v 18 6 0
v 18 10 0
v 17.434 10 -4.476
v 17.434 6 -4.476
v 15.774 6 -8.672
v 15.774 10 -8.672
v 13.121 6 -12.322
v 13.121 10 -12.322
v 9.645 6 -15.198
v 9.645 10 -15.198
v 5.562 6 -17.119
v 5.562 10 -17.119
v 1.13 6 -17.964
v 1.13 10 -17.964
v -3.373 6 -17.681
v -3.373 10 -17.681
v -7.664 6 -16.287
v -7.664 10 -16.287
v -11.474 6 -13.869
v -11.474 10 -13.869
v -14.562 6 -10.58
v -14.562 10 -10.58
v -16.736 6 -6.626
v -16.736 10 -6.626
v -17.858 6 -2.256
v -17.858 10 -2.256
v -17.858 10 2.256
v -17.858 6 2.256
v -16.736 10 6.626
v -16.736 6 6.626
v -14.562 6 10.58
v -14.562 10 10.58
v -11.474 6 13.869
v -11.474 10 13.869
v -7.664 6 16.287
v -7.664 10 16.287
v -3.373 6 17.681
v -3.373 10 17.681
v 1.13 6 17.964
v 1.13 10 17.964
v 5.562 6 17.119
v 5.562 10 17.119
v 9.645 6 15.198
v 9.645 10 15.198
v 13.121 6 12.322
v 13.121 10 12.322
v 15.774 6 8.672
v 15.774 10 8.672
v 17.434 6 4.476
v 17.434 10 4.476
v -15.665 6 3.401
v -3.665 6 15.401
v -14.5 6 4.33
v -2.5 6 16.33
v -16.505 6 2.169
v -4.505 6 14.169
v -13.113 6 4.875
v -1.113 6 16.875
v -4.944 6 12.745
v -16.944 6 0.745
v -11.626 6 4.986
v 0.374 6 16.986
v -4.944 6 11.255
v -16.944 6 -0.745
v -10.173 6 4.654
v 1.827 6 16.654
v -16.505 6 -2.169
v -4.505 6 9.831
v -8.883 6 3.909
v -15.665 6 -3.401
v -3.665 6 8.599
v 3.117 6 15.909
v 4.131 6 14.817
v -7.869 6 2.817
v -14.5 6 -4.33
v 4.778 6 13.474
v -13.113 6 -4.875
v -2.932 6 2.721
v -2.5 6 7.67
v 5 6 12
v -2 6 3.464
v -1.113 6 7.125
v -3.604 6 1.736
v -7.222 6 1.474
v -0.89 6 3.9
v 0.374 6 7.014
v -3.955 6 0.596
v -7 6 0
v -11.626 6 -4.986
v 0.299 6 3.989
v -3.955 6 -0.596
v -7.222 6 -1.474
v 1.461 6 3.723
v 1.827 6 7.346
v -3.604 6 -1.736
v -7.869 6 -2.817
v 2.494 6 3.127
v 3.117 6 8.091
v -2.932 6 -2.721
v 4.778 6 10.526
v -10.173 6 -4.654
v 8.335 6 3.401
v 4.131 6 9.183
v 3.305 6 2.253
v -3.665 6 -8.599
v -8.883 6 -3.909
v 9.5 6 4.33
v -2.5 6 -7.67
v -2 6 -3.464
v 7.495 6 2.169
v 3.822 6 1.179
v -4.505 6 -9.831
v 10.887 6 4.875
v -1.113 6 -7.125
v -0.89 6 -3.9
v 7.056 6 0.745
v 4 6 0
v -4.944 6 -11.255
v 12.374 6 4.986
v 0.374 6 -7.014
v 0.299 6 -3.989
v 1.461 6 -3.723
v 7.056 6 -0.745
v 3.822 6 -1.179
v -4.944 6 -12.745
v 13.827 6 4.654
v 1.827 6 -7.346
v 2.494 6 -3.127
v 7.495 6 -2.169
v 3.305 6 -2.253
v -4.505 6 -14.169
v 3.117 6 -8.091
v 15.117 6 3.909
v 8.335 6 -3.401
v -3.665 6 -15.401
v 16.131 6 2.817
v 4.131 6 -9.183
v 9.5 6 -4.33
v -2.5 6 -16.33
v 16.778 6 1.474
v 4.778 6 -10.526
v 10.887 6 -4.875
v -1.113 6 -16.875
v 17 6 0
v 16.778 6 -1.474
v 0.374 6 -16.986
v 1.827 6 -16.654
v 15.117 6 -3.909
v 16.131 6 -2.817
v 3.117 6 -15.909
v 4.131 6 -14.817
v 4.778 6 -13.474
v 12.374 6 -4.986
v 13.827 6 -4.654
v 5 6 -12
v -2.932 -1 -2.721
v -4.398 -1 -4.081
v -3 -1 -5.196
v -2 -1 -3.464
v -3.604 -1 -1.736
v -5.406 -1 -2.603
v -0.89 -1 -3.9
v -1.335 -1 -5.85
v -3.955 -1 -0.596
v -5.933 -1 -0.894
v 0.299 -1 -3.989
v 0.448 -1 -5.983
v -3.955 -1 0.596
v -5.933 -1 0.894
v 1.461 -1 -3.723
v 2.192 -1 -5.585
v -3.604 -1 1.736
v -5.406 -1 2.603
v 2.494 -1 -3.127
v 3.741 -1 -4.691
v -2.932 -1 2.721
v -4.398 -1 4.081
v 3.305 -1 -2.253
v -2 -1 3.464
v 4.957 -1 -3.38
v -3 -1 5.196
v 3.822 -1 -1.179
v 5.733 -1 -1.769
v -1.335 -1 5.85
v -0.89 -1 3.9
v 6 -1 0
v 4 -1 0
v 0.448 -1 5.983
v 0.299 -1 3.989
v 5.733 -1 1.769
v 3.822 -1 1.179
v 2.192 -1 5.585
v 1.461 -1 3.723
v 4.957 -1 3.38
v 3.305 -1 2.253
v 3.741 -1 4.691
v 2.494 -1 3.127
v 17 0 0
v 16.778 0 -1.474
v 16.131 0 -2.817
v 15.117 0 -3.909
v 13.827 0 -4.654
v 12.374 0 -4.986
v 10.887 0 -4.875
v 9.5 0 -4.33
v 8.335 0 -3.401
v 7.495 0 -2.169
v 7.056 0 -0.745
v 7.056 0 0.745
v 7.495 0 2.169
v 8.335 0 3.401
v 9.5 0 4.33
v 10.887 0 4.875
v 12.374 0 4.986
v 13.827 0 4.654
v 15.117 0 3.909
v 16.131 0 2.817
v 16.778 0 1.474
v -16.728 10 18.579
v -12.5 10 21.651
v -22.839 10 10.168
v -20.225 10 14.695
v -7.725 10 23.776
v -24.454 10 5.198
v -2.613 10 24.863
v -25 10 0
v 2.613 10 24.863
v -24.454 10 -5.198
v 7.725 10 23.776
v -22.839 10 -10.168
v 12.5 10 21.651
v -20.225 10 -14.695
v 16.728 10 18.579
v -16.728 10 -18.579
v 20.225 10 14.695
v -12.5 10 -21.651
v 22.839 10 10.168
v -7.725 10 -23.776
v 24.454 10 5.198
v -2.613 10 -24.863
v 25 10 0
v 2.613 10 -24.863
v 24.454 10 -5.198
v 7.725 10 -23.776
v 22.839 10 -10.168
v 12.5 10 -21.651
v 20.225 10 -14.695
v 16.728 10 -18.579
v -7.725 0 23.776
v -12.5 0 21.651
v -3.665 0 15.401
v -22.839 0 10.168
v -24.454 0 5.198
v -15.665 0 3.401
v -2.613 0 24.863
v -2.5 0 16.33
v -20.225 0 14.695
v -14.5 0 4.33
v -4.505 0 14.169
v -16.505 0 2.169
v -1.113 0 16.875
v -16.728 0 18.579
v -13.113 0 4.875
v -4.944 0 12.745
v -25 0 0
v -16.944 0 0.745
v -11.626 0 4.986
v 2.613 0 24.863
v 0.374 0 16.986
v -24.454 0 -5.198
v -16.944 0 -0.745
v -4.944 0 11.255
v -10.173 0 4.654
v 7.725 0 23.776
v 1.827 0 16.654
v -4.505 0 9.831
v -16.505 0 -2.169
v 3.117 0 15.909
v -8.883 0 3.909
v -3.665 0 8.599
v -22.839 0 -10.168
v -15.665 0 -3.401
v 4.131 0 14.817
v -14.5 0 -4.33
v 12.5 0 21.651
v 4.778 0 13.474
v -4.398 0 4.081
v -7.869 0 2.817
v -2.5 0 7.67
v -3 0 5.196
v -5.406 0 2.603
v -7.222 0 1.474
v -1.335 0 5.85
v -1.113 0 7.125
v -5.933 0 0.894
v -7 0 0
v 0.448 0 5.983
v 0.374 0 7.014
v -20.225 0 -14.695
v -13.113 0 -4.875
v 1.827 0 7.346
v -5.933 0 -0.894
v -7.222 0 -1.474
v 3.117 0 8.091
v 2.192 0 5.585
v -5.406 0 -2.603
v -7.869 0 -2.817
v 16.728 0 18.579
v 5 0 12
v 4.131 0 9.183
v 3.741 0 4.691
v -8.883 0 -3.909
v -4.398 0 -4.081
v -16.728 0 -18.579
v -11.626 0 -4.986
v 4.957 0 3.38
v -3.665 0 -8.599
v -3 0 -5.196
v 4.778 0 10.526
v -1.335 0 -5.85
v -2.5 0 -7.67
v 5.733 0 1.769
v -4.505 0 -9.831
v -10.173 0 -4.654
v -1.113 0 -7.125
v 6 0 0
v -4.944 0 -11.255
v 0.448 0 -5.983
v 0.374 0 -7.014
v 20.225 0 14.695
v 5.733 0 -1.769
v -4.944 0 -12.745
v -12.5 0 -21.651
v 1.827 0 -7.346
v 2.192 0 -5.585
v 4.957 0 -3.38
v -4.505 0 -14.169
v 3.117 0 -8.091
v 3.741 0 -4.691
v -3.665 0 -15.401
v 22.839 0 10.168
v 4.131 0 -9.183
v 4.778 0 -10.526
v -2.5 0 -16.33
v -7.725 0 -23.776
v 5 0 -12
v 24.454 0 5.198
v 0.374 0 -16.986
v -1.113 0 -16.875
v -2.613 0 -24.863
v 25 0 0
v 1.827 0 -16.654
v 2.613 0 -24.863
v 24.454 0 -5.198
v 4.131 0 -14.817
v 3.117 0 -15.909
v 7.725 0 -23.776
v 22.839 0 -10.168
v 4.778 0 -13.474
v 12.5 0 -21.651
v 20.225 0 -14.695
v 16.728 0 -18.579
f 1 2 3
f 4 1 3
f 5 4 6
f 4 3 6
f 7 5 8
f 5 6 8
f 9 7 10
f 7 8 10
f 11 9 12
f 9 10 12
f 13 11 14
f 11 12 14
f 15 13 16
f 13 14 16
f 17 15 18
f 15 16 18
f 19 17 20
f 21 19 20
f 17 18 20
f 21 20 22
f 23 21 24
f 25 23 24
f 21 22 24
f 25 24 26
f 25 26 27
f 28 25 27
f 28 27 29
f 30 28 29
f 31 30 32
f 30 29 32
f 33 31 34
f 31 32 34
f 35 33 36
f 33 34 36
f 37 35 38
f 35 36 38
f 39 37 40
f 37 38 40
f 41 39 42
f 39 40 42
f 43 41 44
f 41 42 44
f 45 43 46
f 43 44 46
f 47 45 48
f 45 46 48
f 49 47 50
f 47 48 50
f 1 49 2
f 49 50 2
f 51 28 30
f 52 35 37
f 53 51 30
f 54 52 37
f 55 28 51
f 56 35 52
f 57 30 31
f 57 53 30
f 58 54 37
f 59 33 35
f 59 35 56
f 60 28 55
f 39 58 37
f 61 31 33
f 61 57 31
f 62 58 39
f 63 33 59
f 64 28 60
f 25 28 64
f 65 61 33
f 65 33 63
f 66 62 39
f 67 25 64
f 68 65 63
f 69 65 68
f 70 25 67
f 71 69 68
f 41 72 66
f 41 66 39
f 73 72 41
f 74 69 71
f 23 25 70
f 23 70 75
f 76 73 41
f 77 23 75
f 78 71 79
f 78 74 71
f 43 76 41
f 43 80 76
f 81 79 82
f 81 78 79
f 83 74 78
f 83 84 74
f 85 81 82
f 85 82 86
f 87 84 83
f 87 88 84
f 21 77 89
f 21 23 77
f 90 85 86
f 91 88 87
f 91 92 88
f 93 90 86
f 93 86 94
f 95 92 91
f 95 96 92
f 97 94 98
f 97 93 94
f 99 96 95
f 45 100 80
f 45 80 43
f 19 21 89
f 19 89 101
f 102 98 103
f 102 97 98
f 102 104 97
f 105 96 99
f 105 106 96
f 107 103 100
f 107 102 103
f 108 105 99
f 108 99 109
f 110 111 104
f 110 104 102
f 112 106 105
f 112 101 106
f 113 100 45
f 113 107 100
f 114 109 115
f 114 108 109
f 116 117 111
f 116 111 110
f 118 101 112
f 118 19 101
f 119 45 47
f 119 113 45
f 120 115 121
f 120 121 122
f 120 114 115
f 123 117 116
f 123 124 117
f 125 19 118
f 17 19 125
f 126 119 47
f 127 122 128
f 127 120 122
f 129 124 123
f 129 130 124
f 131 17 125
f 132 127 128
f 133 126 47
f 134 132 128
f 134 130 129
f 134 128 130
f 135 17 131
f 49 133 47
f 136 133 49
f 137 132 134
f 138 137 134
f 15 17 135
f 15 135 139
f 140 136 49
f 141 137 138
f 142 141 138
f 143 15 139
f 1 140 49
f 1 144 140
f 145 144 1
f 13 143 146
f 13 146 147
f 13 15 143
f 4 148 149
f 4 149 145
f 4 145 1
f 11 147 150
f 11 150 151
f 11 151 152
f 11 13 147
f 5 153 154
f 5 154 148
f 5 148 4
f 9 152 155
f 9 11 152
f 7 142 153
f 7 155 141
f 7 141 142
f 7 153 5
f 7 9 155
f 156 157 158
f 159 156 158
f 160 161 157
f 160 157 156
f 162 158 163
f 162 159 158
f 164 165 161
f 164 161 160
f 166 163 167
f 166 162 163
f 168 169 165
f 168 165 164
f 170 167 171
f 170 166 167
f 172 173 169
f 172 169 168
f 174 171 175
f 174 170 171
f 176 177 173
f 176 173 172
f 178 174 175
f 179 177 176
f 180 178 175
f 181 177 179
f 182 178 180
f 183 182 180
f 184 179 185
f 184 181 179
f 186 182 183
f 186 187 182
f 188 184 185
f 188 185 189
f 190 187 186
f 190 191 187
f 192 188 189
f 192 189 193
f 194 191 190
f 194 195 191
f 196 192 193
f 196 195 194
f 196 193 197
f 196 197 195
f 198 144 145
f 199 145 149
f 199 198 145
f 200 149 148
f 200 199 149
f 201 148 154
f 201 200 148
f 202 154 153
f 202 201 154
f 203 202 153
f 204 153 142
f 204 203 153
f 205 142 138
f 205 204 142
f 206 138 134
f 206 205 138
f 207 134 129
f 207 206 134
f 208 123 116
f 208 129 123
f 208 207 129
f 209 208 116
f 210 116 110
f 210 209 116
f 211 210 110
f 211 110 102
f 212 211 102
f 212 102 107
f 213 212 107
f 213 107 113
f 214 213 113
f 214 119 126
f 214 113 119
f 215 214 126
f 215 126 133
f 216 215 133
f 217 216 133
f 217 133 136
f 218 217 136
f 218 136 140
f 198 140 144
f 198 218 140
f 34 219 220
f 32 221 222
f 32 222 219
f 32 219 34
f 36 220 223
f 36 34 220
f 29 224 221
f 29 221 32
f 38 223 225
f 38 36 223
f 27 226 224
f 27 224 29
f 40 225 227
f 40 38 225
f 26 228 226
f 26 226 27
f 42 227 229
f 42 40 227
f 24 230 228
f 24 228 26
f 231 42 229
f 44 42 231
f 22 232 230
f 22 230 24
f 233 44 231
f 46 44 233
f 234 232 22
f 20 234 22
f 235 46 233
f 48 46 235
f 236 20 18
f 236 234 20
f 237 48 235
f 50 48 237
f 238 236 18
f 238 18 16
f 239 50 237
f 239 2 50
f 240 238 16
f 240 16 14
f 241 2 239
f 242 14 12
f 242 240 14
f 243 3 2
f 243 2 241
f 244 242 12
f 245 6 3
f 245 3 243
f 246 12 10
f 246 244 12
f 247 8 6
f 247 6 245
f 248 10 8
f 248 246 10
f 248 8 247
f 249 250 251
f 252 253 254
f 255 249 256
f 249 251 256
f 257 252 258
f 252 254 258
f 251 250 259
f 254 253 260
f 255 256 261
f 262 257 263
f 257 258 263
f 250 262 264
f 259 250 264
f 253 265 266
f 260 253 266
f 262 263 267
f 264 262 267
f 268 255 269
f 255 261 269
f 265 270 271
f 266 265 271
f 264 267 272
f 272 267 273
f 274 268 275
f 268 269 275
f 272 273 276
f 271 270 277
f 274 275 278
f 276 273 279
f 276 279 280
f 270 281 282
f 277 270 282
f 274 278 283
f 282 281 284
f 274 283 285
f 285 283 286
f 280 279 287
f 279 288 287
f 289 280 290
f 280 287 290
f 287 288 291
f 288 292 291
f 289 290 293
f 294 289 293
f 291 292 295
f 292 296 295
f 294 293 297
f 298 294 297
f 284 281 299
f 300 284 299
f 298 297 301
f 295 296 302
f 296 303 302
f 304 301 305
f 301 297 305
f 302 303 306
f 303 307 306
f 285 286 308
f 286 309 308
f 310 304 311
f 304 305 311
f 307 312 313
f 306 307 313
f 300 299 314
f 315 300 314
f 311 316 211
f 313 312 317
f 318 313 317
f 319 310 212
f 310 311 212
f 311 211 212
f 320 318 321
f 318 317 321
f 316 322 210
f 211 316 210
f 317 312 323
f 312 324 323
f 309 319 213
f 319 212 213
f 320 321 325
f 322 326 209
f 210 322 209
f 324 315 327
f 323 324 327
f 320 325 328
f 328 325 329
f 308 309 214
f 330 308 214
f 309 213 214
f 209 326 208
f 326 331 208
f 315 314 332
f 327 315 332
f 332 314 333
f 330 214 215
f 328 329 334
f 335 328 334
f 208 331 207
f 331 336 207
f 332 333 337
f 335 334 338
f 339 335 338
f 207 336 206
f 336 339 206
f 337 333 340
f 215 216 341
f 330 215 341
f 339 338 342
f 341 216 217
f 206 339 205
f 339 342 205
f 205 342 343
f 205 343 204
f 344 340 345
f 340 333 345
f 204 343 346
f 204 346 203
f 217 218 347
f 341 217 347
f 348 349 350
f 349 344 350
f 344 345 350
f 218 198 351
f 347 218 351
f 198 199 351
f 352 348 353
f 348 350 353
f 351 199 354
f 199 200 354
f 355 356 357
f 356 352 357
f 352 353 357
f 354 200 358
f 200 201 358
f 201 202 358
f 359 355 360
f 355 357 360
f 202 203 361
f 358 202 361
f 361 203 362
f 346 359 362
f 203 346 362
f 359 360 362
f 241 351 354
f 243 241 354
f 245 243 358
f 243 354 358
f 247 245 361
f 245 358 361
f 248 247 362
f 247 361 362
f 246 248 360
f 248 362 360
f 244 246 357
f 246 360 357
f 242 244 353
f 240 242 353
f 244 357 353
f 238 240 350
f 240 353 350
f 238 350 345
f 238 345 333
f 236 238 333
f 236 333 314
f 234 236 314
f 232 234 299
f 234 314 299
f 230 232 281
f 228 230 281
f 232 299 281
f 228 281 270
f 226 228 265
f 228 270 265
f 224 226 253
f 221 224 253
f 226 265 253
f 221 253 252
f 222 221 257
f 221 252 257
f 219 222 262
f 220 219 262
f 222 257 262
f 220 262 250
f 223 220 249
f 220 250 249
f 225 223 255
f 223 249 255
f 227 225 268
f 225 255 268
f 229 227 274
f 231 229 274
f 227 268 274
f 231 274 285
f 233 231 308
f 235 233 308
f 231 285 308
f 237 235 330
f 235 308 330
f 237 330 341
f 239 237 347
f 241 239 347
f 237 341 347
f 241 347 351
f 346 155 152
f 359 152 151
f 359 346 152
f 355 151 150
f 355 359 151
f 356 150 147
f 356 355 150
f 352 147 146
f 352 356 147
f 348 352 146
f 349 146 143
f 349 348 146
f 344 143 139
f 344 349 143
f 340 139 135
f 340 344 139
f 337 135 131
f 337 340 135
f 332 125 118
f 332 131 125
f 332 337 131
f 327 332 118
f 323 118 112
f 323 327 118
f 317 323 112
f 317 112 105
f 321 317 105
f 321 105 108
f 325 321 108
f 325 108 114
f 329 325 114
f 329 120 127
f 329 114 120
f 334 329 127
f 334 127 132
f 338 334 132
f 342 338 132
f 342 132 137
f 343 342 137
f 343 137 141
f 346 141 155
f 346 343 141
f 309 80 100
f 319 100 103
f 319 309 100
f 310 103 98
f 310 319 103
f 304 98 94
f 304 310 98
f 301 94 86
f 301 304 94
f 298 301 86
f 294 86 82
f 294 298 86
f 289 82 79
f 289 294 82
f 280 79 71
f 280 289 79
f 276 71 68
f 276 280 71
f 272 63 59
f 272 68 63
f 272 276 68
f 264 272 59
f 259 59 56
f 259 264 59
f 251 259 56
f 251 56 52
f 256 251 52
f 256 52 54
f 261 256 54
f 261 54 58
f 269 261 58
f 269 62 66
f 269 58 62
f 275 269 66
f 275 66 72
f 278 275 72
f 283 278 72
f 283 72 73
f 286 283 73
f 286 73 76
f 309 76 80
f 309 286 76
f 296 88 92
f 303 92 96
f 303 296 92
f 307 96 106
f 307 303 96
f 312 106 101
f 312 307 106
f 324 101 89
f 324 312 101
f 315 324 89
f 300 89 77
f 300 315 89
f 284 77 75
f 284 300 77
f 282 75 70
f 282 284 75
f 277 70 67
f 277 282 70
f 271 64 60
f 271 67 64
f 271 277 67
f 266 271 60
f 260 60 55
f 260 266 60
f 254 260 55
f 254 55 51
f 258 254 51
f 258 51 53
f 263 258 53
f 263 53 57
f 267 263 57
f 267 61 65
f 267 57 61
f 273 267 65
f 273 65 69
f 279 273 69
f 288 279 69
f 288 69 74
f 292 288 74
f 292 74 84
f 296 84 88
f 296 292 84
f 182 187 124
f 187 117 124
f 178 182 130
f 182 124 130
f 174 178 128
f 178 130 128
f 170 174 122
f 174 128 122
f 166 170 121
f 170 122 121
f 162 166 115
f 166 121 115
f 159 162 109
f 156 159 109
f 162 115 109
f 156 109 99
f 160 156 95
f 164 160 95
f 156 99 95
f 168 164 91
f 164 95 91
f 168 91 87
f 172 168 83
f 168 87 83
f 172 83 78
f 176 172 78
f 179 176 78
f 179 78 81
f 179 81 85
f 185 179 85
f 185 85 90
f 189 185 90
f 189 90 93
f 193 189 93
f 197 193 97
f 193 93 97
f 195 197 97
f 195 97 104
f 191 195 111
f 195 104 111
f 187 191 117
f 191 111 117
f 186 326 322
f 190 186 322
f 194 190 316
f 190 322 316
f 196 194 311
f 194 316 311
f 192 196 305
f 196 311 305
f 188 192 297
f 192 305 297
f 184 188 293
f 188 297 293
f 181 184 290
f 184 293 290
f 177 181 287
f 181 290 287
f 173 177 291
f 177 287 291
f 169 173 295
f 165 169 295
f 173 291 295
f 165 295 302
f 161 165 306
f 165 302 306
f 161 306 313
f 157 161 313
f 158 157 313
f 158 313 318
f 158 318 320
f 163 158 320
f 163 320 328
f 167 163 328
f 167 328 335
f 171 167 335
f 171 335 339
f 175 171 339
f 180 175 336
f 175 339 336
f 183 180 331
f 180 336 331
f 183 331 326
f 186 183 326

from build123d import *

# Parameters (mm, degrees)
SKETCH1_R           = 25
SKETCH1_R_2         = 4
SKETCH1_R_3         = 5
BOSS_EXTRUDE1_DEPTH = 10
SKETCH2_R           = 18
CUT_EXTRUDE1_DEPTH  = 4
SKETCH3_R           = 6
BOSS_EXTRUDE2_DEPTH = 1
SKETCH4_R           = 4
CUT_EXTRUDE2_DEPTH  = 13


with BuildPart() as part:
    # Sketch1 → Boss-Extrude1 (new body)
    with BuildSketch(Plane(origin=(0, 0, 0), x_dir=(1, 0, 0), z_dir=(0, 1, 0))):
        Circle(SKETCH1_R)
        Circle(SKETCH1_R_2, mode=Mode.SUBTRACT)
        with Locations((0, 12)):
            Circle(SKETCH1_R_3, mode=Mode.SUBTRACT)
        with Locations((12, 0)):
            Circle(SKETCH1_R_3, mode=Mode.SUBTRACT)
        with Locations((0, -12)):
            Circle(SKETCH1_R_3, mode=Mode.SUBTRACT)
        with Locations((-12, 0)):
            Circle(SKETCH1_R_3, mode=Mode.SUBTRACT)
    extrude(amount=BOSS_EXTRUDE1_DEPTH)

    # Sketch2 → Cut-Extrude1 (cut)
    with BuildSketch(Plane(origin=(0, 10, 0), x_dir=(1, 0, 0), z_dir=(0, 1, 0))):
        Circle(SKETCH2_R)
    extrude(amount=-CUT_EXTRUDE1_DEPTH, mode=Mode.SUBTRACT)

    # Sketch3 → Boss-Extrude2 (add)
    with BuildSketch(Plane.XZ):
        Circle(SKETCH3_R)
    extrude(amount=BOSS_EXTRUDE2_DEPTH)

    # Sketch4 → Cut-Extrude2 (cut)
    with BuildSketch(Plane(origin=(0, 0, 0), x_dir=(1, 0, 0), z_dir=(0, 1, 0))):
        Circle(SKETCH4_R)
    extrude(amount=-CUT_EXTRUDE2_DEPTH, mode=Mode.SUBTRACT)


solid = part.part
